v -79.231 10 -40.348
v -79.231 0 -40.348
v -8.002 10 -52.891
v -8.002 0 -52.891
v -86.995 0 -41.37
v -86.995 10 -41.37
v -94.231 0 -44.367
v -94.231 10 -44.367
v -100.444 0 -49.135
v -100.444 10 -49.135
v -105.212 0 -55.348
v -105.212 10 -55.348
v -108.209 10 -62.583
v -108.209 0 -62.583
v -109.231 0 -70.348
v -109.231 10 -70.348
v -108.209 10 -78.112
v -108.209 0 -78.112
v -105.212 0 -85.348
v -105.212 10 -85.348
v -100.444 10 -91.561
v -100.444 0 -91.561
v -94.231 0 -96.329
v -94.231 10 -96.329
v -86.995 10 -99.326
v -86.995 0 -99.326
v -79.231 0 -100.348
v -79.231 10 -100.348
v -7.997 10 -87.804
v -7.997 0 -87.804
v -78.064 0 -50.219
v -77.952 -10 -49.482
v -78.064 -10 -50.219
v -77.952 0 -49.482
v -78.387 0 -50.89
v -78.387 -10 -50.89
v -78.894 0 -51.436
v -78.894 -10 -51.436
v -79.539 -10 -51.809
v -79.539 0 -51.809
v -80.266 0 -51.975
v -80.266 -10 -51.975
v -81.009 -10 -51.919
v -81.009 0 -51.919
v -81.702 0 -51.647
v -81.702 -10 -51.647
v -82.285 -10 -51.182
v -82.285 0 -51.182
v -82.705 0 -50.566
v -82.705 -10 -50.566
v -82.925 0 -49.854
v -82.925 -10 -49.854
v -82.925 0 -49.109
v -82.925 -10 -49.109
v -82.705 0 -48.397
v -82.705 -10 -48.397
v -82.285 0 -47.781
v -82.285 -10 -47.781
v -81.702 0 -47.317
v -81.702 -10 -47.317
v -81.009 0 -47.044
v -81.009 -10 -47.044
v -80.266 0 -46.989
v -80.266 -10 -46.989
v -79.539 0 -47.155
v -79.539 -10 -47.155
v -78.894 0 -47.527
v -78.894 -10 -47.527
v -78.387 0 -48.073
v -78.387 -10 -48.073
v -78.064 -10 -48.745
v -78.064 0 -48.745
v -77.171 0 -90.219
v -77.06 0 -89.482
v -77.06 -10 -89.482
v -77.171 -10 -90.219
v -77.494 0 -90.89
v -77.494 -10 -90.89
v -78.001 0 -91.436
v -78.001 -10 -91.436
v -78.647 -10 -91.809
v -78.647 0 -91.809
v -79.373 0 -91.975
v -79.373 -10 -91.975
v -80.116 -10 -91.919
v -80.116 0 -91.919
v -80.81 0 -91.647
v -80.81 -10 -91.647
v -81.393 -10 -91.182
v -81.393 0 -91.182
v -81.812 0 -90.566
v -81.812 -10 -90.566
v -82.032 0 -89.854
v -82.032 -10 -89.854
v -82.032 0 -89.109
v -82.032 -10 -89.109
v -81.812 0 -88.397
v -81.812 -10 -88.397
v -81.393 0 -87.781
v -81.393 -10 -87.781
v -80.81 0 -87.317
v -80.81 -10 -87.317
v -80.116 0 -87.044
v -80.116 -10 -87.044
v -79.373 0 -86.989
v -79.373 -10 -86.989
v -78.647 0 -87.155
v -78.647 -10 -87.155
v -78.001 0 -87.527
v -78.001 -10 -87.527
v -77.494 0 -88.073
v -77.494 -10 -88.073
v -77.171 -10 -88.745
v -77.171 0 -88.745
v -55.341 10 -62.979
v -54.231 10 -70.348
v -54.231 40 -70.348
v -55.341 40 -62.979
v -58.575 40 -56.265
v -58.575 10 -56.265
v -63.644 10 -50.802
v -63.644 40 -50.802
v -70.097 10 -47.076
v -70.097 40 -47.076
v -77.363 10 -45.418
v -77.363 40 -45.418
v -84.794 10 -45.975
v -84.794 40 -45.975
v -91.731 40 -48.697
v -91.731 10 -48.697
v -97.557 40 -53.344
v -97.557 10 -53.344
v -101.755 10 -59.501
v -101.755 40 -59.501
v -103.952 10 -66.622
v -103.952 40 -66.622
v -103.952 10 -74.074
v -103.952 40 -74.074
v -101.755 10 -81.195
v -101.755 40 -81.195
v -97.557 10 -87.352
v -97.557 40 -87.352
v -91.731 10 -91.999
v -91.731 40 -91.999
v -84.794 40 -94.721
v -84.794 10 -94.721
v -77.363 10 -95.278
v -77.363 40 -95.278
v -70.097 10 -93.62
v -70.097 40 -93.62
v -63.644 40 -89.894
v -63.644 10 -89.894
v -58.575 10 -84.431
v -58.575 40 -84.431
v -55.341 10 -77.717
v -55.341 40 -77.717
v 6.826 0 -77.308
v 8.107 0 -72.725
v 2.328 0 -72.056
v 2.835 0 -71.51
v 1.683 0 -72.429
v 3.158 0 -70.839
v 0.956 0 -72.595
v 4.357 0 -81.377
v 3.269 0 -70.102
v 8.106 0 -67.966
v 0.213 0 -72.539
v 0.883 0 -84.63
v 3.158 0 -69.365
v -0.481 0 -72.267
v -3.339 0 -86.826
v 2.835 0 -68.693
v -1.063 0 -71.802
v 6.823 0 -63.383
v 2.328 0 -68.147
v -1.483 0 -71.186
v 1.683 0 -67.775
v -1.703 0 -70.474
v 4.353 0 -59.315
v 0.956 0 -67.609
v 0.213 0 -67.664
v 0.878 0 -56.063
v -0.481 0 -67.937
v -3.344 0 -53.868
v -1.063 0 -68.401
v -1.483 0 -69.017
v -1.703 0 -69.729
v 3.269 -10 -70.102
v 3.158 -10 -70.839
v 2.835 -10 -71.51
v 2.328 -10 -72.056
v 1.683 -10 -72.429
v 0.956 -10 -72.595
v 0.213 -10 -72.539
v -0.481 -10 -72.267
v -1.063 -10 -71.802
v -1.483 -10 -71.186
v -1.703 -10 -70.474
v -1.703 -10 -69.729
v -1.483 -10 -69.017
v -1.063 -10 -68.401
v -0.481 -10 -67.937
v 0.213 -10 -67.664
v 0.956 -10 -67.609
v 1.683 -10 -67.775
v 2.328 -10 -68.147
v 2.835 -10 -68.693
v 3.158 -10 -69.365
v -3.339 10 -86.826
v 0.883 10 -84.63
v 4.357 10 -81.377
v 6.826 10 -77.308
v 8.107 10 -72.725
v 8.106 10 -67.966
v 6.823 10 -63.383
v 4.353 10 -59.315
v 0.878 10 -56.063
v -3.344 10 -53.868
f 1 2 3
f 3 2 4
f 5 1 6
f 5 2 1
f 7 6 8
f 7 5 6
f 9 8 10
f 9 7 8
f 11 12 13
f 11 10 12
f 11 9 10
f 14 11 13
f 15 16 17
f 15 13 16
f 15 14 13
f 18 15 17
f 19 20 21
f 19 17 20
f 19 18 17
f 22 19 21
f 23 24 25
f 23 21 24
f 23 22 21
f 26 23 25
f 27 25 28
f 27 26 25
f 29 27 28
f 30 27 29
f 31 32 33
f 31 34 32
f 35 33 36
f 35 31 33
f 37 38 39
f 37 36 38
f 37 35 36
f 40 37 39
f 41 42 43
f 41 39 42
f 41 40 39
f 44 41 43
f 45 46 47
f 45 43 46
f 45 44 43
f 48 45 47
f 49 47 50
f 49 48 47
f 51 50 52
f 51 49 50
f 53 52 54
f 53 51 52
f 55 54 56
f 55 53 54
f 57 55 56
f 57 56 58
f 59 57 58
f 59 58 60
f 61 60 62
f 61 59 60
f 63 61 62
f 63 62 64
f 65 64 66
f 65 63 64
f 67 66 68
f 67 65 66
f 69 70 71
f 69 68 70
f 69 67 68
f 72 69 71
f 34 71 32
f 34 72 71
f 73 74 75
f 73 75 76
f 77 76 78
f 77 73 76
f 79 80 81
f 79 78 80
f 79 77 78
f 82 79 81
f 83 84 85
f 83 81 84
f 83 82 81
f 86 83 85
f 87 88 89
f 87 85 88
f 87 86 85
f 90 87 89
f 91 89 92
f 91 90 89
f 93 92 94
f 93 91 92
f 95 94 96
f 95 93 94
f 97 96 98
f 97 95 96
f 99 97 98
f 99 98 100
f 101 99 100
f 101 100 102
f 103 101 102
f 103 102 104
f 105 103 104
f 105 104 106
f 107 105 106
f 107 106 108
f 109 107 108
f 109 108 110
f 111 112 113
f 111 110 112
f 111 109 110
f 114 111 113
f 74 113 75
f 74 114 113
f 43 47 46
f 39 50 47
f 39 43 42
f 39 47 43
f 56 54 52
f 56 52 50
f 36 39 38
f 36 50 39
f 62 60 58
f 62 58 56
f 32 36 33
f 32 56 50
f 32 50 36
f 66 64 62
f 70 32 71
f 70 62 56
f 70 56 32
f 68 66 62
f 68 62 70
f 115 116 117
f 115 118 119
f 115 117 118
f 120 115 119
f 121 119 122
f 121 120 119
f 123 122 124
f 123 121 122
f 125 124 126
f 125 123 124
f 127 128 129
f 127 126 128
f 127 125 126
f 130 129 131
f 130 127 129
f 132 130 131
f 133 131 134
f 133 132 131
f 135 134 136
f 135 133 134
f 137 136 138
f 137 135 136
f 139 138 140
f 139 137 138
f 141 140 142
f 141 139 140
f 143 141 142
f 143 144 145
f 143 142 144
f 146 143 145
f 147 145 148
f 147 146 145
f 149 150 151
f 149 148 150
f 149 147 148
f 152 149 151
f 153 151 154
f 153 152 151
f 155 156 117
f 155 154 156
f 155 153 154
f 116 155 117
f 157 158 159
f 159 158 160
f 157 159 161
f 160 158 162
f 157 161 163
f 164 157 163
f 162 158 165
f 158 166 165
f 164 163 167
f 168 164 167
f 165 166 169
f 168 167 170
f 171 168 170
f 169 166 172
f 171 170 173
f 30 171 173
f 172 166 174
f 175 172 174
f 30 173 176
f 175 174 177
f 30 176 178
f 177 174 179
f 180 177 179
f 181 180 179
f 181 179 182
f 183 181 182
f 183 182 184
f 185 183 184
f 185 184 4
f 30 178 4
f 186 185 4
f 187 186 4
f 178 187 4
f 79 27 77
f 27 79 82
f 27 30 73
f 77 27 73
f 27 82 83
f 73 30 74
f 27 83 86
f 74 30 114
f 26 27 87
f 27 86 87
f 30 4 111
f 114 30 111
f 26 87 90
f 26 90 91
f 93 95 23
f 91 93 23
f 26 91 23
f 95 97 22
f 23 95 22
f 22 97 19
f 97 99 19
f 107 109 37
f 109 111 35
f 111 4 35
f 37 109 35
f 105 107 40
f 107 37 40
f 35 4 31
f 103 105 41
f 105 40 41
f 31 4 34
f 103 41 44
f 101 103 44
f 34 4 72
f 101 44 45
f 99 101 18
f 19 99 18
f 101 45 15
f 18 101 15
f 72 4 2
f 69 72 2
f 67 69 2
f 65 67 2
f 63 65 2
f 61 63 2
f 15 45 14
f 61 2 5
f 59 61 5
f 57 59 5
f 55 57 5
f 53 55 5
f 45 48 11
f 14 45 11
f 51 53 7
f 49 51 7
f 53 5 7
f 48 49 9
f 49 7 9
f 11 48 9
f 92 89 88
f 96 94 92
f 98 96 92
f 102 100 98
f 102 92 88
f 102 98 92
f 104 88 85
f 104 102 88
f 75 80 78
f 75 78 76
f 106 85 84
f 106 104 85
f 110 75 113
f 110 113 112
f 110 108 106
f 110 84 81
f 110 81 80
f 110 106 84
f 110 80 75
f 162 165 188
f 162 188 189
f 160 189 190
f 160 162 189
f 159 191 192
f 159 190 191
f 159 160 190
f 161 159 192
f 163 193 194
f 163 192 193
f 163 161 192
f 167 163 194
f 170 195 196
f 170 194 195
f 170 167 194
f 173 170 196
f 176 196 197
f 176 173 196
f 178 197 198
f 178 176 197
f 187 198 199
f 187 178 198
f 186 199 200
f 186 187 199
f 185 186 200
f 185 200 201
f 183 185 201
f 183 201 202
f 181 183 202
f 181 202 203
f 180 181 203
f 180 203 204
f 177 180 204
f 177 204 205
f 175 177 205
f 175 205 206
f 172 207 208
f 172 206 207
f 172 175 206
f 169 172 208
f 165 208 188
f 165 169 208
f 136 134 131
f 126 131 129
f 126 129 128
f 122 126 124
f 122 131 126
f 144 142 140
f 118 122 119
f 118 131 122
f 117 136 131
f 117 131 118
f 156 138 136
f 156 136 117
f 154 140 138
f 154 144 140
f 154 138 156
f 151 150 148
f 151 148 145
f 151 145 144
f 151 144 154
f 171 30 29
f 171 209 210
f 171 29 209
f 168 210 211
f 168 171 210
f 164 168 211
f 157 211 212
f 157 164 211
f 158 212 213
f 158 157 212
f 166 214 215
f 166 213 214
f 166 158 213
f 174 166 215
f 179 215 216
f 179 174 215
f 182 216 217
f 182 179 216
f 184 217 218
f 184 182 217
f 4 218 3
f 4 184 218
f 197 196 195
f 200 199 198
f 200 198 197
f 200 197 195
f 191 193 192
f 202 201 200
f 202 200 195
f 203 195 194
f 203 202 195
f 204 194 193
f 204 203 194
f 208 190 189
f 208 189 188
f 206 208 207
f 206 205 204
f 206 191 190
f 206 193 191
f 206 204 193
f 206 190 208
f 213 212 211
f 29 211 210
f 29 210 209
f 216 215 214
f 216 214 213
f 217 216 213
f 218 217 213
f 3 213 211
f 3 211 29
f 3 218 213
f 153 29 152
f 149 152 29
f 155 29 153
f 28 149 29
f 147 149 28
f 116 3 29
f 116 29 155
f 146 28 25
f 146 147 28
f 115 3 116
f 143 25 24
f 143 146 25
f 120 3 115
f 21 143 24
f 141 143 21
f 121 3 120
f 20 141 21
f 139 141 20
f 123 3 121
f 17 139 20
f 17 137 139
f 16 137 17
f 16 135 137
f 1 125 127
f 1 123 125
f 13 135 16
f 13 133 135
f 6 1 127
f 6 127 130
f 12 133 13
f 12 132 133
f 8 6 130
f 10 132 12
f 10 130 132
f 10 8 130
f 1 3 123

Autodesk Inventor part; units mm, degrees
ref_plane "YZ Plane" through (0, 0, 0) normal (1, 0, 0) x (0, 1, 0)
ref_plane "XZ Plane" through (0, 0, 0) normal (0, 1, 0) x (-1, 0, 0)
ref_plane "XY Plane" through (0, 0, 0) normal (0, 0, 1) x (1, 0, 0)
sketch "Skizze1" plane through (0, 0, 0) normal (0, 1, 0) x (-1, 0, 0)
  circle A0 centre (9.2308, -70.3479) radius 17.5
  arc A1 (79.2308, -100.3479) -> (79.2308, -40.3479) centre (79.2308, -70.3479) ccw
  line L0 (79.2308, -40.3479) -> (8.002, -52.8911)
  line L1 (79.2308, -100.3479) -> (7.9966, -87.8043)
  circle A2 centre (79.2308, -70.3479) radius 20
  point P0 (0, 0)
  dimension "d1" = 35
  dimension "d20" = 30
  dimension "d21" = 70
  dimension "d22" = 0
  dimension "d24" = 40
extrude "Extrusion1" add sketch "Skizze1" along normal blind 10 contours A0 | A0 L0 A1 L1 | A2
sketch "Skizze2" plane through (0, 10, 0) normal (0, 1, 0) x (1, 0, 0)
  arc A0 (-79.2308, 100.3479) -> (-79.2308, 40.3479) centre (-79.2308, 70.3479) ccw projected
  circle A1 centre (-79.2308, 70.3479) radius 25
  point P0 (0, 0)
  dimension "d23" = 50
extrude "Extrusion2" add sketch "Skizze2" along normal blind 30
sketch "Skizze3" plane through (0, 0, 0) normal (0, -1, 0) x (1, 0, 0)
  circle A0 centre (-79.56, -89.4817) radius 2.5
  circle A1 centre (-80.4525, -49.4817) radius 2.5
  circle A2 centre (0.7692, -70.1017) radius 2.5
  arc A3 (-8.002, -52.8911) -> (-8.002, -52.8911) centre (-9.2308, -70.3479) ccw projected
  point P0 (0, 0)
  point P1 (-8.4112, -91.1215)
  point P2 (-79.56, -69.4817)
  dimension "d7" = 5
  dimension "d8" = 5
  dimension "d9" = 5
  dimension "d10" = 10
  dimension "d11" = 20
  dimension "d12" = 0
  dimension "d13" = 20
extrude "Extrusion3" add sketch "Skizze3" along normal blind 10 contours A0 | A1 | A2
properties part number "LIDAR-Sensor"
